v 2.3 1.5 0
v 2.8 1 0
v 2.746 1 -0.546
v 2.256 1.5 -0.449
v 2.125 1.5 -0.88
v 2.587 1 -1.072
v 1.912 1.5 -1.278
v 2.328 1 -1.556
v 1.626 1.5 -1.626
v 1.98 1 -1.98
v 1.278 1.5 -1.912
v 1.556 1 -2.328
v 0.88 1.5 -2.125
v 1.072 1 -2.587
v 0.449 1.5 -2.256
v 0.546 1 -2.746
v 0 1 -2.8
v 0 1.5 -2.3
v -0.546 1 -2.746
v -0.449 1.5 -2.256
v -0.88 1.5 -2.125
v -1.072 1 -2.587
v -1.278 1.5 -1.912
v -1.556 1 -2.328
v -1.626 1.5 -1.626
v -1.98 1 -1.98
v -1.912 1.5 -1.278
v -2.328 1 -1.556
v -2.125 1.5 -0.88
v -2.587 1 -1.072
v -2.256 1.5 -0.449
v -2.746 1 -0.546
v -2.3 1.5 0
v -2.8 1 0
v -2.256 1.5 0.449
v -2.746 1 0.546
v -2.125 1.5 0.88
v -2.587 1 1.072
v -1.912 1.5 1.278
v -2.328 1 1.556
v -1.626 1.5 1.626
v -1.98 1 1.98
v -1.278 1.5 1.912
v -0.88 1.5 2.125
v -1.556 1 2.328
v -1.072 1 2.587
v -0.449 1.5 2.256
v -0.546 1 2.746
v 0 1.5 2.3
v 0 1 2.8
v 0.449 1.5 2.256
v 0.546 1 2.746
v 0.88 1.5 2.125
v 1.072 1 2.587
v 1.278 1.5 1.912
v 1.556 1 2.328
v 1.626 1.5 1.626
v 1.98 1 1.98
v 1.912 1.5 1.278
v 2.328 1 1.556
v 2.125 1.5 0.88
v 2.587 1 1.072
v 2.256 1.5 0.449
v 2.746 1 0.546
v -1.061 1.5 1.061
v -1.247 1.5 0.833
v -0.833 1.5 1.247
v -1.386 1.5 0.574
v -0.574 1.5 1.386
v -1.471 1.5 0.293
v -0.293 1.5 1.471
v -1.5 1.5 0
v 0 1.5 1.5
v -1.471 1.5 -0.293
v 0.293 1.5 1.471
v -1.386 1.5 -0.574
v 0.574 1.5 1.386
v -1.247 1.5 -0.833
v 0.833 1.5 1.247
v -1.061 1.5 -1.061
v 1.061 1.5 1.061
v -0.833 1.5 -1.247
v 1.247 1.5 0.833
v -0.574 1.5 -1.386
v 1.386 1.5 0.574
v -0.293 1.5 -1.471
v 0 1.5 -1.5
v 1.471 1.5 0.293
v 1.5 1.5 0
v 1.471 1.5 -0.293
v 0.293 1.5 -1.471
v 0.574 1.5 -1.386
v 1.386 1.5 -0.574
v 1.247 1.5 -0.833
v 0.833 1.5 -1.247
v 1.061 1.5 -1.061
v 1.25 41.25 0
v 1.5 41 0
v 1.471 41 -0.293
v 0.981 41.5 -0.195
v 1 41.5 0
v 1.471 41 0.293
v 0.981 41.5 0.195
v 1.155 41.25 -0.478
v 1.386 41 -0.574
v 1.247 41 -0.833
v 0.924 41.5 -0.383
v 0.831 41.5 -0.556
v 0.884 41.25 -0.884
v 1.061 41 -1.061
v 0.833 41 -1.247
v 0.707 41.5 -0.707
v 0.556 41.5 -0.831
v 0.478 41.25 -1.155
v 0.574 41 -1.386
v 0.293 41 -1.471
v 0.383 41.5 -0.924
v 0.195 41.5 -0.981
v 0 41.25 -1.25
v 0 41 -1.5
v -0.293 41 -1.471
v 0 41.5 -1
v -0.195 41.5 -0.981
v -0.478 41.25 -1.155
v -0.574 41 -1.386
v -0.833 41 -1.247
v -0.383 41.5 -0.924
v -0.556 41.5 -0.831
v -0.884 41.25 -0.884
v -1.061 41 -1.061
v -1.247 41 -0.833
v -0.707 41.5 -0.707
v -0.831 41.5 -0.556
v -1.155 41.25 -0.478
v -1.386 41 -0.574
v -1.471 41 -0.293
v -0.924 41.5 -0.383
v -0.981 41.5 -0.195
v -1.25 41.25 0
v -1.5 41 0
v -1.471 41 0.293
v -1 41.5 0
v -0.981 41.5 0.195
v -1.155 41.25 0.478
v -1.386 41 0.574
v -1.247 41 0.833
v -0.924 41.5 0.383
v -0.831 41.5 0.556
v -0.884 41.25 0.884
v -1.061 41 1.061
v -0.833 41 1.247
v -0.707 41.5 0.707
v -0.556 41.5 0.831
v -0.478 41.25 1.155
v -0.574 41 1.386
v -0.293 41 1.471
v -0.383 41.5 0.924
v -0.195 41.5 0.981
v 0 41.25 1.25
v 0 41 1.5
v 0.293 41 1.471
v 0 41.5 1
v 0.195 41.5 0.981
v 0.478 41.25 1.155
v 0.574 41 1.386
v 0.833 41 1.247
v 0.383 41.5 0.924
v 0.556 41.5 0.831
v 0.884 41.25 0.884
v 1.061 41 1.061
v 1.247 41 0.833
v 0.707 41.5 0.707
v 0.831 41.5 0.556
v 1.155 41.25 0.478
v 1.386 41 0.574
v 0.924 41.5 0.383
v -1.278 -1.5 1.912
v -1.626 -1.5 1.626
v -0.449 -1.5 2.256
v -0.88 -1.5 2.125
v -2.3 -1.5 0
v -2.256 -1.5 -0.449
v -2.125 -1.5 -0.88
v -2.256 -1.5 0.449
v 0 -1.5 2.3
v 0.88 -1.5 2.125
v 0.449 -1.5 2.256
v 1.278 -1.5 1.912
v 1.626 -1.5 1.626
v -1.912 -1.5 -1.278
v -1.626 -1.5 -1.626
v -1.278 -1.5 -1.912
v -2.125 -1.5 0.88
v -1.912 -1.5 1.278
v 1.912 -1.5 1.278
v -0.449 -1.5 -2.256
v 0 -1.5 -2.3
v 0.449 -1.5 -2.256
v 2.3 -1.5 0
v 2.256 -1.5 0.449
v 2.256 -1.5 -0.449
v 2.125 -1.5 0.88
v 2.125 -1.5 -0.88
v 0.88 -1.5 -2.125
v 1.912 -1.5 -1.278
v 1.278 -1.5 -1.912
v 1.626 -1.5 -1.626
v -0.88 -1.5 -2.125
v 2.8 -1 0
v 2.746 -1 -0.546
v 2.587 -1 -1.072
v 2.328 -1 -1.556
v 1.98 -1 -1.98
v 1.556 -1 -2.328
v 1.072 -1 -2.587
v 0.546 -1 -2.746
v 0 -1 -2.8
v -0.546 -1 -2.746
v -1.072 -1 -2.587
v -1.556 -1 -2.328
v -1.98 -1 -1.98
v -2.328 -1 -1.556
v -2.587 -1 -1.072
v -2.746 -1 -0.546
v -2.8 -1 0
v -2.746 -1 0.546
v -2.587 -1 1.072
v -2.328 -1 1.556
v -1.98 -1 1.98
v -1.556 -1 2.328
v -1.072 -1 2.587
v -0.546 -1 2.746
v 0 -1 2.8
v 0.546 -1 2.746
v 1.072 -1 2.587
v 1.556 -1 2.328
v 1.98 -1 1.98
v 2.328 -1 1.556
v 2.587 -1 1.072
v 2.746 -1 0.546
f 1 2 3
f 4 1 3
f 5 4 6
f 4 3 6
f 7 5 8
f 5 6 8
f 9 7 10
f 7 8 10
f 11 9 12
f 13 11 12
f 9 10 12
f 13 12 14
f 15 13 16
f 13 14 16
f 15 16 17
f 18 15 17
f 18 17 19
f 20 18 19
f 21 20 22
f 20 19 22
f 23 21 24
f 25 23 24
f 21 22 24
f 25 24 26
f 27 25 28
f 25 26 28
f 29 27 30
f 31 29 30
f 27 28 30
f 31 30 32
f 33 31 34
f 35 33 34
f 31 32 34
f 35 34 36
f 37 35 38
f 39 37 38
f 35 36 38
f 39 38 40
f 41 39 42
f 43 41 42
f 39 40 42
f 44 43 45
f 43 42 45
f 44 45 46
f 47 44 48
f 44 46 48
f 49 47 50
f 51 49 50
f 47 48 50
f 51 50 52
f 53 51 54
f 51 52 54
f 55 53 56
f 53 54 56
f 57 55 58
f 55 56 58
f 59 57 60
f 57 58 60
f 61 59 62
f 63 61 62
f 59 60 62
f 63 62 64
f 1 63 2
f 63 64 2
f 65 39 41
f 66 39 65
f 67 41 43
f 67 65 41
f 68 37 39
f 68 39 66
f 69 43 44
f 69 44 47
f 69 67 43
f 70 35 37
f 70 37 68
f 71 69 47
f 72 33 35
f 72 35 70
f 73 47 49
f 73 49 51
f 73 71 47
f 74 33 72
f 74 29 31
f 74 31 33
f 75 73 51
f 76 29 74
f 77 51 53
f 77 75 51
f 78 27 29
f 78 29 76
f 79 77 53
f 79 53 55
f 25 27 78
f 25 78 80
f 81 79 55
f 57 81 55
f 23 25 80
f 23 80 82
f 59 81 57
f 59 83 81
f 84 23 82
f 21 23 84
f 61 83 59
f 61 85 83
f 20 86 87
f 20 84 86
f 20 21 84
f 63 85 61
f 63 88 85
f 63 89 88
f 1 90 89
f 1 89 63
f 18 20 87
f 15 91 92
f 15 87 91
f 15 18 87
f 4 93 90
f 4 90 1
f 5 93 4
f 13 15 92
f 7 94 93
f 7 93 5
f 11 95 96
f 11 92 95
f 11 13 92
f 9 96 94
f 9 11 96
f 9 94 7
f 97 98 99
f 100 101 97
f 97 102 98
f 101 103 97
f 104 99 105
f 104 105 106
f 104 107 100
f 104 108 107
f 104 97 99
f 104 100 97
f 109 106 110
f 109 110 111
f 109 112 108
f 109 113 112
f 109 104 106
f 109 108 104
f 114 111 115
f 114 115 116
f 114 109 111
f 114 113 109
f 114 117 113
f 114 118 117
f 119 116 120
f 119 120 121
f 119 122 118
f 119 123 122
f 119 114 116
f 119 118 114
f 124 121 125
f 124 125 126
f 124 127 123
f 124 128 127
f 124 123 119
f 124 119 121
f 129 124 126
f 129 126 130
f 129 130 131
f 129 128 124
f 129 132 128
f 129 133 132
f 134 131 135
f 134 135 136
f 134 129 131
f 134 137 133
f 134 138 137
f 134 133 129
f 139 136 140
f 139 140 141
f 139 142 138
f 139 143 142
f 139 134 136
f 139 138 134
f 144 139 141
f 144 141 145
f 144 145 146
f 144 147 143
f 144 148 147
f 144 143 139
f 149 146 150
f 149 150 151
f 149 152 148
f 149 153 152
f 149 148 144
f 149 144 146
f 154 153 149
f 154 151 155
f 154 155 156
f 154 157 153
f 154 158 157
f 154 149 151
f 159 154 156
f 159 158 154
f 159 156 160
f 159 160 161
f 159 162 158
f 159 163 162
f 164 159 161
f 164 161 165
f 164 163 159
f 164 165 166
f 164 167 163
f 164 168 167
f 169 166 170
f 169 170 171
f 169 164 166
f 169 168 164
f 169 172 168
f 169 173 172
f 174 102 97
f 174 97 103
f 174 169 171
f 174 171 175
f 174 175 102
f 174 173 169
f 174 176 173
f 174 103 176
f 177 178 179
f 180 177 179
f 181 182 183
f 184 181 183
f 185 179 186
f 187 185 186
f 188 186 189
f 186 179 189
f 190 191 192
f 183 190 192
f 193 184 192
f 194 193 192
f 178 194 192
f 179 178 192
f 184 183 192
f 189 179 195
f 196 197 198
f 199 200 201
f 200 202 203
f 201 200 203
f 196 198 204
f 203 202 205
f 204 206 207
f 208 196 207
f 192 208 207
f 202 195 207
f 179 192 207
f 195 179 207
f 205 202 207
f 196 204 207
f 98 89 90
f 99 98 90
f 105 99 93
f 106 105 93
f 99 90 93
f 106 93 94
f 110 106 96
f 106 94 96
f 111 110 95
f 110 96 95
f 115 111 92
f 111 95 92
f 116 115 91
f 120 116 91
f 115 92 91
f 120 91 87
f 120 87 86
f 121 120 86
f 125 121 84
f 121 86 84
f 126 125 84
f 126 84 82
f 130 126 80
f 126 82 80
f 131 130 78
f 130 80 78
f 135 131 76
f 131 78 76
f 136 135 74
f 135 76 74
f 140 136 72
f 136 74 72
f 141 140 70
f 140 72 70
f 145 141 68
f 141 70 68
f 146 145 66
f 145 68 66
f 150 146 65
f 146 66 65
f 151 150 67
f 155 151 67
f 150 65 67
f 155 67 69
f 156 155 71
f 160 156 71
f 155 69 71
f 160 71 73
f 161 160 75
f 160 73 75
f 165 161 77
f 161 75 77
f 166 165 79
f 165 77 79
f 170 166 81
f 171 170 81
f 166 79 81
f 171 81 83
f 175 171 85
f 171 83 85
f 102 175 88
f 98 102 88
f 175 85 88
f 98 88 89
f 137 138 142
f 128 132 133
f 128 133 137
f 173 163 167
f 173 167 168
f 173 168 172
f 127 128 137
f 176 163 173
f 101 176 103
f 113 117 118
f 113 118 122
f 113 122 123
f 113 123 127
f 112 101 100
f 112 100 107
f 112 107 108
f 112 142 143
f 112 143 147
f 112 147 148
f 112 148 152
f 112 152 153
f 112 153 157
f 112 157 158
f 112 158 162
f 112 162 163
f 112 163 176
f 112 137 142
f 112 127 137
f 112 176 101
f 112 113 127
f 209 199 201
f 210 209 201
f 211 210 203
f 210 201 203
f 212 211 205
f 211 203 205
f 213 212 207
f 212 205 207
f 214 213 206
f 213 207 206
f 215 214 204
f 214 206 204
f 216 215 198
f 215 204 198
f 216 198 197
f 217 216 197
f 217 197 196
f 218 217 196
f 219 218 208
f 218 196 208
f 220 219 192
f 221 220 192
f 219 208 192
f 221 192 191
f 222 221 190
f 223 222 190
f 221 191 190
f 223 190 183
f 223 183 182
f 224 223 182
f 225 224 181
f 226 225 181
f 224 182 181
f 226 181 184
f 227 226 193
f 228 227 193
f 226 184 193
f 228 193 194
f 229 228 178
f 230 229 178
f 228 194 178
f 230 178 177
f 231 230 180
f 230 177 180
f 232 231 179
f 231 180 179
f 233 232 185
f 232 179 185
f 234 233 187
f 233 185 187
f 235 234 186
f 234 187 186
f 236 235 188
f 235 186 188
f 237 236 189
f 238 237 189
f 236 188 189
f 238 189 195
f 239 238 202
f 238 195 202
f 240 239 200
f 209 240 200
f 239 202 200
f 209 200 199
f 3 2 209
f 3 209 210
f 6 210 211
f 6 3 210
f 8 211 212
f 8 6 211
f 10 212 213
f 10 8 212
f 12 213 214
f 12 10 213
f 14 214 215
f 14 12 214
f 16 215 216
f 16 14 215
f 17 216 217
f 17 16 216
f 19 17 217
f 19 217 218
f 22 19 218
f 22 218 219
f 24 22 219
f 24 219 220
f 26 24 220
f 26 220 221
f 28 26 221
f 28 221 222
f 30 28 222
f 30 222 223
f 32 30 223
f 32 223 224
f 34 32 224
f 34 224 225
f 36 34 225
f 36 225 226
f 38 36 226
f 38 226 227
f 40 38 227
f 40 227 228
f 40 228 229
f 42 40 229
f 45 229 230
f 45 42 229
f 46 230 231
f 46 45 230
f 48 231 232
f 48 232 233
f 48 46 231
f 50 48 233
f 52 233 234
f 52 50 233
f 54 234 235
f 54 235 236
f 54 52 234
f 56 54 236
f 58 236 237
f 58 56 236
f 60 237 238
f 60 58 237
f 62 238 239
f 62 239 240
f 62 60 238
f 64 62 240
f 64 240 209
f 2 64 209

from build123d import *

# Parameters (mm, degrees)
SKETCH1_R           = 2.8
BOSS_EXTRUDE1_DEPTH = 1.5
SKETCH2_R           = 1.5
BOSS_EXTRUDE2_DEPTH = 40
CHAMFER1_SIZE       = 0.5
CHAMFER2_SIZE       = 0.5


with BuildPart() as part:
    # Sketch1 → Boss-Extrude1 (new body, symmetric)
    with BuildSketch(Plane(origin=(0, 0, 0), x_dir=(1, 0, 0), z_dir=(0, 1, 0))):
        Circle(SKETCH1_R)
    extrude(amount=BOSS_EXTRUDE1_DEPTH, both=True)

    # Sketch2 → Boss-Extrude2 (add)
    with BuildSketch(Plane(origin=(0, 1.5, 0), x_dir=(1, 0, 0), z_dir=(0, 1, 0))):
        Circle(SKETCH2_R)
    extrude(amount=BOSS_EXTRUDE2_DEPTH)

    # Chamfer1
    chamfer1_edges = [part.edges().sort_by_distance(p)[0] for p in [
        (-1.5, 41.5, 0),
    ]]
    chamfer(chamfer1_edges, length=CHAMFER1_SIZE)

    # Chamfer2
    chamfer2_edges = [part.edges().sort_by_distance(p)[0] for p in [
        (-2.8, -1.5, 0),
        (-2.8, 1.5, 0),
    ]]
    chamfer(chamfer2_edges, length=CHAMFER2_SIZE)


solid = part.part
